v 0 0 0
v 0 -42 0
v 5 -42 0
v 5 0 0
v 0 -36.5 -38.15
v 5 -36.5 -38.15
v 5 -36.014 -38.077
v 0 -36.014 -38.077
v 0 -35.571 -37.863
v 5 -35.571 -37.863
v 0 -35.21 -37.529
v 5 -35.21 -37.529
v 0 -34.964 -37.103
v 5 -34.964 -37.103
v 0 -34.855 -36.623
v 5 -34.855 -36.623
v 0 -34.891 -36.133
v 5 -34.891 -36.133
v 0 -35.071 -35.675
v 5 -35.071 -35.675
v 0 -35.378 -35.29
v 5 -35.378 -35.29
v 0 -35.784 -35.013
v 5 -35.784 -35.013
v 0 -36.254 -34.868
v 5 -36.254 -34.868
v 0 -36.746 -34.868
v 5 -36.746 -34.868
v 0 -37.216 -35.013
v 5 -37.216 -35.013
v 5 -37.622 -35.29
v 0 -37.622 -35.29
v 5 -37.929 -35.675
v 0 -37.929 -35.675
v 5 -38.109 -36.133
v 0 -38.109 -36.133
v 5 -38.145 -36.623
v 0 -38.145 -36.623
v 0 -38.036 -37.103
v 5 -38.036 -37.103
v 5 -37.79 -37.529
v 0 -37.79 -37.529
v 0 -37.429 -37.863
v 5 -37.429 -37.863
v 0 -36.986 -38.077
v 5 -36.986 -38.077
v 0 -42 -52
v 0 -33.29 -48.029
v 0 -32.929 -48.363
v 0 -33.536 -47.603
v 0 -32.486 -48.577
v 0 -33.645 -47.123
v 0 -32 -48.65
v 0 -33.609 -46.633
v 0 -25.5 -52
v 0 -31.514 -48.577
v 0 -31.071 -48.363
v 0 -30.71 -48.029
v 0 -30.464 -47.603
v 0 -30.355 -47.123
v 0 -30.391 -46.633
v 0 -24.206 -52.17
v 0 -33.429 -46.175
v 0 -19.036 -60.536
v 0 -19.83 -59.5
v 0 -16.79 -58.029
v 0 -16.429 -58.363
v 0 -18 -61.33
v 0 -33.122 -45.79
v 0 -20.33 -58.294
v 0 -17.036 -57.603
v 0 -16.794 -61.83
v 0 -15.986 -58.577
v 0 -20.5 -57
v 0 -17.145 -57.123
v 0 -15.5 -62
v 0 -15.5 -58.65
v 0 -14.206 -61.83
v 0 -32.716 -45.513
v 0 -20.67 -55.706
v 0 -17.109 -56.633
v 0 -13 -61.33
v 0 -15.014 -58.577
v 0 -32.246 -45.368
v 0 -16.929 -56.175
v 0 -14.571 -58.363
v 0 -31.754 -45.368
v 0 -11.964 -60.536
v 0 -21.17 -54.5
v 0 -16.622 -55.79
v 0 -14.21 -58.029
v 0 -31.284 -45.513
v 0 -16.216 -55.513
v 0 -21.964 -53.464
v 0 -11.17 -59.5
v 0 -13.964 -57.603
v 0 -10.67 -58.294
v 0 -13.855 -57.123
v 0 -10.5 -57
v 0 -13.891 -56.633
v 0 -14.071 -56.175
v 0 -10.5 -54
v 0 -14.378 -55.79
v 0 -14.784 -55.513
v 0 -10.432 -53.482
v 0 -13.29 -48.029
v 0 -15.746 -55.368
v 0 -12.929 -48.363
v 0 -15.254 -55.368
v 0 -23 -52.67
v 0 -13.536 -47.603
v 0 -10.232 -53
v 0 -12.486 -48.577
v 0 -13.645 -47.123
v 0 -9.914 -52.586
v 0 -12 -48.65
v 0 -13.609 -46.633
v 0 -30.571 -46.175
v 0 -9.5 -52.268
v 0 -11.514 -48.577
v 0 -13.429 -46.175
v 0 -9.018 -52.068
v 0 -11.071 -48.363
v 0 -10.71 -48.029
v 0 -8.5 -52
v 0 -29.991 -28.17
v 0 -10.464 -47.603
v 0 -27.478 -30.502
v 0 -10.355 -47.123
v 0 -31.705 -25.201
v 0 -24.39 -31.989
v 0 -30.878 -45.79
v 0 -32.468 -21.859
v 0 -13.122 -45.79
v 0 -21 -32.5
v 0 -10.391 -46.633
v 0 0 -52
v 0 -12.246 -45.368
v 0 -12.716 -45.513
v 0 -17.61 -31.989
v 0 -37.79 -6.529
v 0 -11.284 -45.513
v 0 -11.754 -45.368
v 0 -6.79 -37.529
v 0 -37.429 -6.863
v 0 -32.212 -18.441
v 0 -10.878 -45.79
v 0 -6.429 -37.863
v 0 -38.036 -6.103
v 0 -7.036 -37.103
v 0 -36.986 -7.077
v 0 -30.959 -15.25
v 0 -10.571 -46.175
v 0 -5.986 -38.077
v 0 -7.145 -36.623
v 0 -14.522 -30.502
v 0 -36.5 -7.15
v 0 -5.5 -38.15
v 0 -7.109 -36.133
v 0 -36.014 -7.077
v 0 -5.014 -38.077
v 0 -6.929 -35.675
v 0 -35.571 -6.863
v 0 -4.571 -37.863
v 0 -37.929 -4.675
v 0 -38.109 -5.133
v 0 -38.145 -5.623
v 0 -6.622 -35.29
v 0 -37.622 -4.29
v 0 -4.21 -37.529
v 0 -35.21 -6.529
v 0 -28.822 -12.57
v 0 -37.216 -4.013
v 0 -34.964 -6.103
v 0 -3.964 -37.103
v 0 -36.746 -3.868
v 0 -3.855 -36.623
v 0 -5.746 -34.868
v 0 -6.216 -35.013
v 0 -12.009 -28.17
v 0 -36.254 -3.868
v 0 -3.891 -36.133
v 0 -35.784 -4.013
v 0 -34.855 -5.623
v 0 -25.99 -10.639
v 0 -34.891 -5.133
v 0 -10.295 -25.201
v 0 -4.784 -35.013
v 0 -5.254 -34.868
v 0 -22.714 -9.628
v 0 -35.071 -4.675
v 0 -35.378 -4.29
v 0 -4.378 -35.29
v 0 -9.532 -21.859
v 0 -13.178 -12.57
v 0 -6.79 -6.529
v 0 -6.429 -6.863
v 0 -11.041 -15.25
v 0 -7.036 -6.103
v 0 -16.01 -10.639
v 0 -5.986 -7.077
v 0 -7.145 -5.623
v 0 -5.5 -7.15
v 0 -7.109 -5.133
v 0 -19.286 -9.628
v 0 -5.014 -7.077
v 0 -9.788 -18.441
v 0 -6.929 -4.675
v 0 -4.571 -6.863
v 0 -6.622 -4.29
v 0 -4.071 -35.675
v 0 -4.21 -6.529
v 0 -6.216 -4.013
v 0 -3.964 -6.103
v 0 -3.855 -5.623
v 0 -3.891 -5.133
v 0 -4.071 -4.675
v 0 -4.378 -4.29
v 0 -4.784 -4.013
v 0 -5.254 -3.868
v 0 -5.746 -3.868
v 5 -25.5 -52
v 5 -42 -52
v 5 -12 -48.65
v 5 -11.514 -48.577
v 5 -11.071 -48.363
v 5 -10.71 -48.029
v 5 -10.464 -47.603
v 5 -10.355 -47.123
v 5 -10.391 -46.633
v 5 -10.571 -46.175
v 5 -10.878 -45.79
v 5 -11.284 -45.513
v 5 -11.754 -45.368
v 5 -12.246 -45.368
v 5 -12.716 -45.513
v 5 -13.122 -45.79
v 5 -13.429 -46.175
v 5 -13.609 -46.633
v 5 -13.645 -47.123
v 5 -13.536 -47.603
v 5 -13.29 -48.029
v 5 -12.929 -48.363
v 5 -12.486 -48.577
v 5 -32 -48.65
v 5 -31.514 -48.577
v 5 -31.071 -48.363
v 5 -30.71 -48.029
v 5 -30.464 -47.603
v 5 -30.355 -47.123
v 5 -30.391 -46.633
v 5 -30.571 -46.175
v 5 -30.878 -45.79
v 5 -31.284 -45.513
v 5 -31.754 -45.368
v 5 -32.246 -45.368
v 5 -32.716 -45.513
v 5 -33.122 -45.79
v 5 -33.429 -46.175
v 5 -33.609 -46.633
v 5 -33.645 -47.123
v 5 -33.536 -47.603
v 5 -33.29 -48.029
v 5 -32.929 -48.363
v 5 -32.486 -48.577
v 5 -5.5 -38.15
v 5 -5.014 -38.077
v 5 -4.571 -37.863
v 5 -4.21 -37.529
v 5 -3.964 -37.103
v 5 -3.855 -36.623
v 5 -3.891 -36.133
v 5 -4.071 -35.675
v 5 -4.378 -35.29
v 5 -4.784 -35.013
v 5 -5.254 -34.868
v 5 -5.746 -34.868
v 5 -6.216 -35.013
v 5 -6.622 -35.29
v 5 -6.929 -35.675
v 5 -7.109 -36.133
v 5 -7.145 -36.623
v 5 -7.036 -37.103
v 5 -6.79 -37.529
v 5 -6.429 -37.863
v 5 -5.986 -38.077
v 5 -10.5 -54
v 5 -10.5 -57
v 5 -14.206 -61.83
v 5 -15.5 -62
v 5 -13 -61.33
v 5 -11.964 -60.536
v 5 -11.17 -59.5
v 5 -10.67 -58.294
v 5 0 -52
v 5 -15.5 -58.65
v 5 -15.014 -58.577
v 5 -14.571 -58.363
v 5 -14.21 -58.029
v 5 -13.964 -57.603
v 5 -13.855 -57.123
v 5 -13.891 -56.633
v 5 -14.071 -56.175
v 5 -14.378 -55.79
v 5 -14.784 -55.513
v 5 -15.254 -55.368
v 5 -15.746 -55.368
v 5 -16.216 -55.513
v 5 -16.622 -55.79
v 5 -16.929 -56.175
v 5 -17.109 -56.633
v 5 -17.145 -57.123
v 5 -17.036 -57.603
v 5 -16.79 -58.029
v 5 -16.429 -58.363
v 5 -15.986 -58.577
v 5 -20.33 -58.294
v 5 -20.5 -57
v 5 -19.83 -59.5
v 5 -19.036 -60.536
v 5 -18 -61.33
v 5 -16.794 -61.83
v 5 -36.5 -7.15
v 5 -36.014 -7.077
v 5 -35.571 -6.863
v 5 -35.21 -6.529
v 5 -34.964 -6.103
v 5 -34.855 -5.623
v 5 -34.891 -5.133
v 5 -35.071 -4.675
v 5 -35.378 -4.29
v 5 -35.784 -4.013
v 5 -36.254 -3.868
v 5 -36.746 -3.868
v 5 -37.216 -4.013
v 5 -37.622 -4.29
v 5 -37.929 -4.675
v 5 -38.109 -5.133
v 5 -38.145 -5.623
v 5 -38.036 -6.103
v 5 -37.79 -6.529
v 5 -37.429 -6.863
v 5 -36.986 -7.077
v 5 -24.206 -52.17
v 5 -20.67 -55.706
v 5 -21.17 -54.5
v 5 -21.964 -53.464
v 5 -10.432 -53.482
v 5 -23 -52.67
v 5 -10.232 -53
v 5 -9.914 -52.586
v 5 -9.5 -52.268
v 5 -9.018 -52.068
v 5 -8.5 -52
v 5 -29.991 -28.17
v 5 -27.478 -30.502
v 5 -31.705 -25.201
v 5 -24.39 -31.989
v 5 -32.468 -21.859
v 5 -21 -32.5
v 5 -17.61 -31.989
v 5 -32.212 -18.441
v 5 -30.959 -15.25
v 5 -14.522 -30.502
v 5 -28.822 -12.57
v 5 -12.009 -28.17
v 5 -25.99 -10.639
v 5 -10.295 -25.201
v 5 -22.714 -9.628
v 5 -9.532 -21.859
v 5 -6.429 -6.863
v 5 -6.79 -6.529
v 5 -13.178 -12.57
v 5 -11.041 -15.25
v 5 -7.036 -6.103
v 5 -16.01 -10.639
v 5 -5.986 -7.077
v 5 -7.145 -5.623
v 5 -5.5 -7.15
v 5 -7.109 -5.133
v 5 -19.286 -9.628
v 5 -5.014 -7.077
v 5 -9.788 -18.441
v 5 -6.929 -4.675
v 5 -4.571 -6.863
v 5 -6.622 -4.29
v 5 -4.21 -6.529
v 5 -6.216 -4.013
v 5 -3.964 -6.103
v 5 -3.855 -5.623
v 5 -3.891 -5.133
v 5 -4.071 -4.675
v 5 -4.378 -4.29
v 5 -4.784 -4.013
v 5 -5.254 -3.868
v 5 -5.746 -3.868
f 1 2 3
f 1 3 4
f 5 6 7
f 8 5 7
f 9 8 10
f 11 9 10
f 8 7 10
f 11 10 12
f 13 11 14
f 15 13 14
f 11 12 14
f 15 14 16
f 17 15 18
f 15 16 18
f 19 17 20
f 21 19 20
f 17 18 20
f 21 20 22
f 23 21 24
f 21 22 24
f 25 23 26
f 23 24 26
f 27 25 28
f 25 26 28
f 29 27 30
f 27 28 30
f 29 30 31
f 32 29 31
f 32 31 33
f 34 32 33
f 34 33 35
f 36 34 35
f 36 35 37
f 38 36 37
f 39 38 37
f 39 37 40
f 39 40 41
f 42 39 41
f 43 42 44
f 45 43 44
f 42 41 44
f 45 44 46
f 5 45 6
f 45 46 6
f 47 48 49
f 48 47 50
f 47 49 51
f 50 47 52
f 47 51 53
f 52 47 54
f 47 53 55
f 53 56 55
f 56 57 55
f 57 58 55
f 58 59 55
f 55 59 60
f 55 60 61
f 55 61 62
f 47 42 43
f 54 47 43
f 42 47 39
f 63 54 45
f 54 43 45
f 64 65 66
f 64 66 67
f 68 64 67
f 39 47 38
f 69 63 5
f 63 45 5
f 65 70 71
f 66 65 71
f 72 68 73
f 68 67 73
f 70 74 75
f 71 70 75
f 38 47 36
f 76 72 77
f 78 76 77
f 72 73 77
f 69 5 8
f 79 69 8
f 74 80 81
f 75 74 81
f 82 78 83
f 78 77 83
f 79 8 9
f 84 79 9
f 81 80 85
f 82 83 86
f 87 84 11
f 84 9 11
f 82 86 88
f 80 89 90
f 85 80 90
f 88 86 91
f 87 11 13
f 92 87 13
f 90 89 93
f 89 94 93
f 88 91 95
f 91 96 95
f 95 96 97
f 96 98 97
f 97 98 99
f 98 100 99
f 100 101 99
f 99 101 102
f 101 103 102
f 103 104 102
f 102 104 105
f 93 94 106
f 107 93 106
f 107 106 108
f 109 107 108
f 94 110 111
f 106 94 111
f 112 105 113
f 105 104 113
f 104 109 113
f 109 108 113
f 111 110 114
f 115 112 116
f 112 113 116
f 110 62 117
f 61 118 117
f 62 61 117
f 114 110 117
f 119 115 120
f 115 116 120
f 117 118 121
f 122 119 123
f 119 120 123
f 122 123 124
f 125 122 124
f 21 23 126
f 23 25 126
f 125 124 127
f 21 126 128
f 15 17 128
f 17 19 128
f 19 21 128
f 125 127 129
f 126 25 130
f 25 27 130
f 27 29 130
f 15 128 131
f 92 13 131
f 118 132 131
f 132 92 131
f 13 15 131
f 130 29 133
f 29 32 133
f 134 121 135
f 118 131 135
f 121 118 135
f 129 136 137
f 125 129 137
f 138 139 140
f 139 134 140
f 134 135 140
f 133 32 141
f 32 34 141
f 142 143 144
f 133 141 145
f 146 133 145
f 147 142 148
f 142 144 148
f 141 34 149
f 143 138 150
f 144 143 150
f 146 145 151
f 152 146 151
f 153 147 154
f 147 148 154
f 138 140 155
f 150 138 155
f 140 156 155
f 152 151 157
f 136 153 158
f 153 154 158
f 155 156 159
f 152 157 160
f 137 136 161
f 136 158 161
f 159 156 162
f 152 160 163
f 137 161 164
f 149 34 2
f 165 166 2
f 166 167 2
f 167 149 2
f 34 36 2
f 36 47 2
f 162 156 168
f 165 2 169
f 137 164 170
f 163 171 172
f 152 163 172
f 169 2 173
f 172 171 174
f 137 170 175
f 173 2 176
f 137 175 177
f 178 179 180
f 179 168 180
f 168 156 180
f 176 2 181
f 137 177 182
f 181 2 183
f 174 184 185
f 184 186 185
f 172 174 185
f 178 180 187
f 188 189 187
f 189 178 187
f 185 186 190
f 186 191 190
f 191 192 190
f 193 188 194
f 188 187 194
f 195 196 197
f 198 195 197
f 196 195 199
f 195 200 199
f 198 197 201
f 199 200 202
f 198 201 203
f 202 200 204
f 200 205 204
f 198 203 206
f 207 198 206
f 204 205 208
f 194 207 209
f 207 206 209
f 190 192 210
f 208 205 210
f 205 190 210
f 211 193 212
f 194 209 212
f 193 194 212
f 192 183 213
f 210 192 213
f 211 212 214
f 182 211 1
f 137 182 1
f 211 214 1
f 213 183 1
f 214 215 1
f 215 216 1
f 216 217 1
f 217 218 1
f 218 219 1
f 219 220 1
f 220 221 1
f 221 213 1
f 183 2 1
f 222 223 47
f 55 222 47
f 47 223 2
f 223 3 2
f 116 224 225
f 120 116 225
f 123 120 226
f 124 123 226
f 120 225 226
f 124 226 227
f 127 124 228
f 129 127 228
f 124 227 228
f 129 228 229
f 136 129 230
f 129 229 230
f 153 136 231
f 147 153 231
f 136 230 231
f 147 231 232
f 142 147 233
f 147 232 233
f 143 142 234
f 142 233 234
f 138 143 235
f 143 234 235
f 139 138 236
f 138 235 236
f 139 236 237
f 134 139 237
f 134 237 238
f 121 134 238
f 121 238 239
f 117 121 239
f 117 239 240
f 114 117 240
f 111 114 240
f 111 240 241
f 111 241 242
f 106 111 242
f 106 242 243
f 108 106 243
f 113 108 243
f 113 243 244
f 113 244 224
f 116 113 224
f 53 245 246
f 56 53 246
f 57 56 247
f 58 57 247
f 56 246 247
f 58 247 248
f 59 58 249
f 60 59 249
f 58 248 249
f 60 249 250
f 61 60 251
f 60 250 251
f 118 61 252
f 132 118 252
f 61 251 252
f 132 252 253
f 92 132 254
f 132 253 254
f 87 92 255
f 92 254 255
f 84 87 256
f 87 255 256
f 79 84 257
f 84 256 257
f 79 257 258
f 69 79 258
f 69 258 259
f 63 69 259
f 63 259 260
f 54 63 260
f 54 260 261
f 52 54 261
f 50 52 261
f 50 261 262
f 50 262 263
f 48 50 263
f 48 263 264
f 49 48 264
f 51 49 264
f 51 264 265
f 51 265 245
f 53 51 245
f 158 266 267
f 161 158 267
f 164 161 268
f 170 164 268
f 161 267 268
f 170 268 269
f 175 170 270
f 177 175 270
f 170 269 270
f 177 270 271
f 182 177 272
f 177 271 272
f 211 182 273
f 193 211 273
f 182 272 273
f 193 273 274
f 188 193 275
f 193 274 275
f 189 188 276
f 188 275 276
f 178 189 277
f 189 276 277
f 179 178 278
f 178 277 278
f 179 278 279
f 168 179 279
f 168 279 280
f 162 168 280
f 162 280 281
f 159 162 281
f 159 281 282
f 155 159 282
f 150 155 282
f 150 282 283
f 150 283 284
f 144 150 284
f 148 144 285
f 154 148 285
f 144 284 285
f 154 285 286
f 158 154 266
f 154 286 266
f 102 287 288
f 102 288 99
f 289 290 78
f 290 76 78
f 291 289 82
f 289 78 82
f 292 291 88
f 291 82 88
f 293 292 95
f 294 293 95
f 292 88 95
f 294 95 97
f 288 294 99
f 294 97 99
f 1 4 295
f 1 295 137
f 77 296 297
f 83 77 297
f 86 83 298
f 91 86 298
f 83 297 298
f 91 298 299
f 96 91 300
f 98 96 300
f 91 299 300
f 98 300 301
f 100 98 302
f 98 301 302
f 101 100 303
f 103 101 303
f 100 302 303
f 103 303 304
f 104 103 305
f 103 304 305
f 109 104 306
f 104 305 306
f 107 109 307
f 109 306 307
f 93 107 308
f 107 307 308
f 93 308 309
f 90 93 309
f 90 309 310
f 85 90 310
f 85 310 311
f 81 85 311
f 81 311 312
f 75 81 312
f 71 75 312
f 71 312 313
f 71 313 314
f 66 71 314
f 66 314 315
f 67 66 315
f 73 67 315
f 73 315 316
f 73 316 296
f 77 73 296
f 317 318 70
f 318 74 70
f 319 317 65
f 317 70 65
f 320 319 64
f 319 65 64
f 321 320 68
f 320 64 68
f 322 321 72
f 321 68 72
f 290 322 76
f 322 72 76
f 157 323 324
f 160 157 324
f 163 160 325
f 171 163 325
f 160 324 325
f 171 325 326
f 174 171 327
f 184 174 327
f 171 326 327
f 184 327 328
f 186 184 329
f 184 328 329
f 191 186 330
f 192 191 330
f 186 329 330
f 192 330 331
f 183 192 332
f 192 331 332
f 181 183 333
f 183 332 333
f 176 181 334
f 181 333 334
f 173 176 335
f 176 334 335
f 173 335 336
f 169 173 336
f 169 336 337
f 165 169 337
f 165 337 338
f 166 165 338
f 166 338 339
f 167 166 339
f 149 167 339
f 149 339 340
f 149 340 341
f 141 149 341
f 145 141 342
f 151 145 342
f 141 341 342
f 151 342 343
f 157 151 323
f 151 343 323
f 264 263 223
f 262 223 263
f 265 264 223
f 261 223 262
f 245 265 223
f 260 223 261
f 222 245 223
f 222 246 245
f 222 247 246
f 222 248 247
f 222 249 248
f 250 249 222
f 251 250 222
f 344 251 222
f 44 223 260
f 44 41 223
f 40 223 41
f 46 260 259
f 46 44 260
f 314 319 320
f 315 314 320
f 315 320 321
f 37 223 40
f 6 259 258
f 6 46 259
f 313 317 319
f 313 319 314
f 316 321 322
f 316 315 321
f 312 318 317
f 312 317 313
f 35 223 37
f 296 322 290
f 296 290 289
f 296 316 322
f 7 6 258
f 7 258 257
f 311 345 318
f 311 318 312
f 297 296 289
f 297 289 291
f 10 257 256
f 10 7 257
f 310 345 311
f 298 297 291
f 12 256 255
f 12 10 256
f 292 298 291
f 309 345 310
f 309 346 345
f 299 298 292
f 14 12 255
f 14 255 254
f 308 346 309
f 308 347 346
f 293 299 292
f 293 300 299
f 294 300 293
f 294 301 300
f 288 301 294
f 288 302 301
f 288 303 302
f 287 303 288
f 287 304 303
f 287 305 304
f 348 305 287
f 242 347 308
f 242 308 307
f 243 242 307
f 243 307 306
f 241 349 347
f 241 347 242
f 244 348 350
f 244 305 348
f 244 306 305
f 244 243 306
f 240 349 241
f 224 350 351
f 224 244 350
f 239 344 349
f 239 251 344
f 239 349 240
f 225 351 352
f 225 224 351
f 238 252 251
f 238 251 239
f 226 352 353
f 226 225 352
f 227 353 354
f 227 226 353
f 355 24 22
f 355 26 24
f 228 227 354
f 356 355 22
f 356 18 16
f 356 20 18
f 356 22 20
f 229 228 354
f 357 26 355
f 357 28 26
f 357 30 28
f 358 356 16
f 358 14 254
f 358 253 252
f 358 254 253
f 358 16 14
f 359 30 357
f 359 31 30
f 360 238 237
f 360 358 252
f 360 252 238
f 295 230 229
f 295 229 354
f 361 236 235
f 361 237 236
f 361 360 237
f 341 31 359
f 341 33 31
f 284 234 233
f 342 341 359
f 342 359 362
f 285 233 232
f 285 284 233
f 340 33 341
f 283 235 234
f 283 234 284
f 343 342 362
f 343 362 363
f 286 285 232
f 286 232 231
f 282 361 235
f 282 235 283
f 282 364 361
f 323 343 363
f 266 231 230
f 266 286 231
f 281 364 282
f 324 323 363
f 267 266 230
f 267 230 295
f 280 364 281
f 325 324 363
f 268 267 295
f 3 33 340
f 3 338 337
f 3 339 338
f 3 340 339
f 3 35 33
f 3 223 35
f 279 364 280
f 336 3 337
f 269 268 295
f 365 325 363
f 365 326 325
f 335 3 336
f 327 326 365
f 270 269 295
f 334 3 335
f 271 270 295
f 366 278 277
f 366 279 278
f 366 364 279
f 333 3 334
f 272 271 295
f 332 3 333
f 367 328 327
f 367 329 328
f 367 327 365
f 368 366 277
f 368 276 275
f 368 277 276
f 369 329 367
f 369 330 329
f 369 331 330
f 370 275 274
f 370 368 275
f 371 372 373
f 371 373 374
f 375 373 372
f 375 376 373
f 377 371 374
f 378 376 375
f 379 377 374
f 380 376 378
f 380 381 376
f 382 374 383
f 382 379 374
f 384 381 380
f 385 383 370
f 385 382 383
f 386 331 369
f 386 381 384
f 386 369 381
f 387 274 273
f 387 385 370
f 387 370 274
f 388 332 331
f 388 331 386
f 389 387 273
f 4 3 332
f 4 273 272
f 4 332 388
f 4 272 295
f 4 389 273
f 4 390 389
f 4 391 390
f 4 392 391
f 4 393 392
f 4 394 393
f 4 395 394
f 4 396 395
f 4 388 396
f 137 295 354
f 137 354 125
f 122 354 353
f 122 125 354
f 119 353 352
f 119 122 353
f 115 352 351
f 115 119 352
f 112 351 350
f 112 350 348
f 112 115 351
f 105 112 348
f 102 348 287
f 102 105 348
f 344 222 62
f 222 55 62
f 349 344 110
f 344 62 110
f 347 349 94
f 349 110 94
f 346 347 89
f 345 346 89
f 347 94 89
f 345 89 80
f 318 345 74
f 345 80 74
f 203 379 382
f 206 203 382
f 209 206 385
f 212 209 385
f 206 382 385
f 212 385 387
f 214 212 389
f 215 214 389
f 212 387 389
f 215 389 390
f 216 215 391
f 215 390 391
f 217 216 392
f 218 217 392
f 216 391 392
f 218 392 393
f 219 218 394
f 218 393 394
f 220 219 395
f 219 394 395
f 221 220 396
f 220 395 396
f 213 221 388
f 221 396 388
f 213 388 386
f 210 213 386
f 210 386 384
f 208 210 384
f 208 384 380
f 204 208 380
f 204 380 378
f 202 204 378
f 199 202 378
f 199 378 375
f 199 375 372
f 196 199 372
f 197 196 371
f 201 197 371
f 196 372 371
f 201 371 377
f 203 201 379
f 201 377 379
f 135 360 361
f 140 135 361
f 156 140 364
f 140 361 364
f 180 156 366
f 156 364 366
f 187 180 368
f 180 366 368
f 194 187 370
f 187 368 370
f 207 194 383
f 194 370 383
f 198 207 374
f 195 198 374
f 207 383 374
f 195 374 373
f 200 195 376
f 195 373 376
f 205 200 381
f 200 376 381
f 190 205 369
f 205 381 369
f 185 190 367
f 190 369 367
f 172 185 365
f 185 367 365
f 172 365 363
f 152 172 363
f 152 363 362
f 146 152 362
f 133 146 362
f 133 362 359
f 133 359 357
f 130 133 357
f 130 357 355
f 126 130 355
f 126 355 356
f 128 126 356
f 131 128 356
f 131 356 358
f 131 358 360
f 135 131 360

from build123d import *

# Parameters (mm, degrees)
SKETCH1_W           = 42
SKETCH1_H           = 42
BOSS_EXTRUDE1_DEPTH = 5
SKETCH2_R           = 1.65
CUT_EXTRUDE1_DEPTH  = 5
SKETCH3_W           = 5
SKETCH3_H           = 42
BOSS_EXTRUDE2_DEPTH = 10
SKETCH4_W           = 5
SKETCH4_H           = 10
BOSS_EXTRUDE3_DEPTH = 10
SKETCH5_R           = 1.65
CUT_EXTRUDE2_DEPTH  = 10
FILLET1_R           = 5
FILLET2_R           = 2
SKETCH6_R           = 11.5
CUT_EXTRUDE3_DEPTH  = 10


with BuildPart() as part:
    # Sketch1 → Boss-Extrude1 (new body)
    with BuildSketch(Plane(origin=(0, 0, 0), x_dir=(0, 0, -1), z_dir=(1, 0, 0))):
        with Locations((21, -21)):
            Rectangle(SKETCH1_W, SKETCH1_H)
    extrude(amount=BOSS_EXTRUDE1_DEPTH)

    # Sketch2 → Cut-Extrude1 (cut)
    with BuildSketch(Plane(origin=(5, 0, 0), x_dir=(0, 0, -1), z_dir=(1, 0, 0))):
        with Locations((5.5, -5.5)):
            Circle(SKETCH2_R)
        with Locations((36.5, -5.5)):
            Circle(SKETCH2_R)
        with Locations((36.5, -36.5)):
            Circle(SKETCH2_R)
        with Locations((5.5, -36.5)):
            Circle(SKETCH2_R)
    extrude(amount=-CUT_EXTRUDE1_DEPTH, mode=Mode.SUBTRACT)

    # Sketch3 → Boss-Extrude2 (add)
    with BuildSketch(Plane(origin=(0, 0, -42), x_dir=(-1, 0, 0), z_dir=(0, 0, -1))):
        with Locations((-2.5, -21)):
            Rectangle(SKETCH3_W, SKETCH3_H)
    extrude(amount=BOSS_EXTRUDE2_DEPTH)

    # Sketch4 → Boss-Extrude3 (add)
    with BuildSketch(Plane(origin=(0, 0, -52), x_dir=(-1, 0, 0), z_dir=(0, 0, -1))):
        with Locations((-2.5, -15.5)):
            Rectangle(SKETCH4_W, SKETCH4_H)
    extrude(amount=BOSS_EXTRUDE3_DEPTH)

    # Sketch5 → Cut-Extrude2 (cut)
    with BuildSketch(Plane(origin=(5, 0, 0), x_dir=(0, 0, -1), z_dir=(1, 0, 0))):
        with Locations((57, -15.5)):
            Circle(SKETCH5_R)
        with Locations((47, -32)):
            Circle(SKETCH5_R)
        with Locations((47, -12)):
            Circle(SKETCH5_R)
    extrude(amount=-CUT_EXTRUDE2_DEPTH, mode=Mode.SUBTRACT)

    # Fillet1
    fillet1_edges = [part.edges().sort_by_distance(p)[0] for p in [
        (2.5, -10.5, -62),
        (2.5, -20.5, -62),
        (2.5, -20.5, -52),
    ]]
    fillet(fillet1_edges, radius=FILLET1_R - 0.0001)  # a hair under: the kernel refuses the full size

    # Fillet2
    fillet2_edges = [part.edges().sort_by_distance(p)[0] for p in [
        (2.5, -10.5, -52),
    ]]
    fillet(fillet2_edges, radius=FILLET2_R)

    # Sketch6 → Cut-Extrude3 (cut)
    with BuildSketch(Plane(origin=(5, 0, 0), x_dir=(0, 0, -1), z_dir=(1, 0, 0))):
        with Locations((21, -21)):
            Circle(SKETCH6_R)
    extrude(amount=-CUT_EXTRUDE3_DEPTH, mode=Mode.SUBTRACT)


solid = part.part
